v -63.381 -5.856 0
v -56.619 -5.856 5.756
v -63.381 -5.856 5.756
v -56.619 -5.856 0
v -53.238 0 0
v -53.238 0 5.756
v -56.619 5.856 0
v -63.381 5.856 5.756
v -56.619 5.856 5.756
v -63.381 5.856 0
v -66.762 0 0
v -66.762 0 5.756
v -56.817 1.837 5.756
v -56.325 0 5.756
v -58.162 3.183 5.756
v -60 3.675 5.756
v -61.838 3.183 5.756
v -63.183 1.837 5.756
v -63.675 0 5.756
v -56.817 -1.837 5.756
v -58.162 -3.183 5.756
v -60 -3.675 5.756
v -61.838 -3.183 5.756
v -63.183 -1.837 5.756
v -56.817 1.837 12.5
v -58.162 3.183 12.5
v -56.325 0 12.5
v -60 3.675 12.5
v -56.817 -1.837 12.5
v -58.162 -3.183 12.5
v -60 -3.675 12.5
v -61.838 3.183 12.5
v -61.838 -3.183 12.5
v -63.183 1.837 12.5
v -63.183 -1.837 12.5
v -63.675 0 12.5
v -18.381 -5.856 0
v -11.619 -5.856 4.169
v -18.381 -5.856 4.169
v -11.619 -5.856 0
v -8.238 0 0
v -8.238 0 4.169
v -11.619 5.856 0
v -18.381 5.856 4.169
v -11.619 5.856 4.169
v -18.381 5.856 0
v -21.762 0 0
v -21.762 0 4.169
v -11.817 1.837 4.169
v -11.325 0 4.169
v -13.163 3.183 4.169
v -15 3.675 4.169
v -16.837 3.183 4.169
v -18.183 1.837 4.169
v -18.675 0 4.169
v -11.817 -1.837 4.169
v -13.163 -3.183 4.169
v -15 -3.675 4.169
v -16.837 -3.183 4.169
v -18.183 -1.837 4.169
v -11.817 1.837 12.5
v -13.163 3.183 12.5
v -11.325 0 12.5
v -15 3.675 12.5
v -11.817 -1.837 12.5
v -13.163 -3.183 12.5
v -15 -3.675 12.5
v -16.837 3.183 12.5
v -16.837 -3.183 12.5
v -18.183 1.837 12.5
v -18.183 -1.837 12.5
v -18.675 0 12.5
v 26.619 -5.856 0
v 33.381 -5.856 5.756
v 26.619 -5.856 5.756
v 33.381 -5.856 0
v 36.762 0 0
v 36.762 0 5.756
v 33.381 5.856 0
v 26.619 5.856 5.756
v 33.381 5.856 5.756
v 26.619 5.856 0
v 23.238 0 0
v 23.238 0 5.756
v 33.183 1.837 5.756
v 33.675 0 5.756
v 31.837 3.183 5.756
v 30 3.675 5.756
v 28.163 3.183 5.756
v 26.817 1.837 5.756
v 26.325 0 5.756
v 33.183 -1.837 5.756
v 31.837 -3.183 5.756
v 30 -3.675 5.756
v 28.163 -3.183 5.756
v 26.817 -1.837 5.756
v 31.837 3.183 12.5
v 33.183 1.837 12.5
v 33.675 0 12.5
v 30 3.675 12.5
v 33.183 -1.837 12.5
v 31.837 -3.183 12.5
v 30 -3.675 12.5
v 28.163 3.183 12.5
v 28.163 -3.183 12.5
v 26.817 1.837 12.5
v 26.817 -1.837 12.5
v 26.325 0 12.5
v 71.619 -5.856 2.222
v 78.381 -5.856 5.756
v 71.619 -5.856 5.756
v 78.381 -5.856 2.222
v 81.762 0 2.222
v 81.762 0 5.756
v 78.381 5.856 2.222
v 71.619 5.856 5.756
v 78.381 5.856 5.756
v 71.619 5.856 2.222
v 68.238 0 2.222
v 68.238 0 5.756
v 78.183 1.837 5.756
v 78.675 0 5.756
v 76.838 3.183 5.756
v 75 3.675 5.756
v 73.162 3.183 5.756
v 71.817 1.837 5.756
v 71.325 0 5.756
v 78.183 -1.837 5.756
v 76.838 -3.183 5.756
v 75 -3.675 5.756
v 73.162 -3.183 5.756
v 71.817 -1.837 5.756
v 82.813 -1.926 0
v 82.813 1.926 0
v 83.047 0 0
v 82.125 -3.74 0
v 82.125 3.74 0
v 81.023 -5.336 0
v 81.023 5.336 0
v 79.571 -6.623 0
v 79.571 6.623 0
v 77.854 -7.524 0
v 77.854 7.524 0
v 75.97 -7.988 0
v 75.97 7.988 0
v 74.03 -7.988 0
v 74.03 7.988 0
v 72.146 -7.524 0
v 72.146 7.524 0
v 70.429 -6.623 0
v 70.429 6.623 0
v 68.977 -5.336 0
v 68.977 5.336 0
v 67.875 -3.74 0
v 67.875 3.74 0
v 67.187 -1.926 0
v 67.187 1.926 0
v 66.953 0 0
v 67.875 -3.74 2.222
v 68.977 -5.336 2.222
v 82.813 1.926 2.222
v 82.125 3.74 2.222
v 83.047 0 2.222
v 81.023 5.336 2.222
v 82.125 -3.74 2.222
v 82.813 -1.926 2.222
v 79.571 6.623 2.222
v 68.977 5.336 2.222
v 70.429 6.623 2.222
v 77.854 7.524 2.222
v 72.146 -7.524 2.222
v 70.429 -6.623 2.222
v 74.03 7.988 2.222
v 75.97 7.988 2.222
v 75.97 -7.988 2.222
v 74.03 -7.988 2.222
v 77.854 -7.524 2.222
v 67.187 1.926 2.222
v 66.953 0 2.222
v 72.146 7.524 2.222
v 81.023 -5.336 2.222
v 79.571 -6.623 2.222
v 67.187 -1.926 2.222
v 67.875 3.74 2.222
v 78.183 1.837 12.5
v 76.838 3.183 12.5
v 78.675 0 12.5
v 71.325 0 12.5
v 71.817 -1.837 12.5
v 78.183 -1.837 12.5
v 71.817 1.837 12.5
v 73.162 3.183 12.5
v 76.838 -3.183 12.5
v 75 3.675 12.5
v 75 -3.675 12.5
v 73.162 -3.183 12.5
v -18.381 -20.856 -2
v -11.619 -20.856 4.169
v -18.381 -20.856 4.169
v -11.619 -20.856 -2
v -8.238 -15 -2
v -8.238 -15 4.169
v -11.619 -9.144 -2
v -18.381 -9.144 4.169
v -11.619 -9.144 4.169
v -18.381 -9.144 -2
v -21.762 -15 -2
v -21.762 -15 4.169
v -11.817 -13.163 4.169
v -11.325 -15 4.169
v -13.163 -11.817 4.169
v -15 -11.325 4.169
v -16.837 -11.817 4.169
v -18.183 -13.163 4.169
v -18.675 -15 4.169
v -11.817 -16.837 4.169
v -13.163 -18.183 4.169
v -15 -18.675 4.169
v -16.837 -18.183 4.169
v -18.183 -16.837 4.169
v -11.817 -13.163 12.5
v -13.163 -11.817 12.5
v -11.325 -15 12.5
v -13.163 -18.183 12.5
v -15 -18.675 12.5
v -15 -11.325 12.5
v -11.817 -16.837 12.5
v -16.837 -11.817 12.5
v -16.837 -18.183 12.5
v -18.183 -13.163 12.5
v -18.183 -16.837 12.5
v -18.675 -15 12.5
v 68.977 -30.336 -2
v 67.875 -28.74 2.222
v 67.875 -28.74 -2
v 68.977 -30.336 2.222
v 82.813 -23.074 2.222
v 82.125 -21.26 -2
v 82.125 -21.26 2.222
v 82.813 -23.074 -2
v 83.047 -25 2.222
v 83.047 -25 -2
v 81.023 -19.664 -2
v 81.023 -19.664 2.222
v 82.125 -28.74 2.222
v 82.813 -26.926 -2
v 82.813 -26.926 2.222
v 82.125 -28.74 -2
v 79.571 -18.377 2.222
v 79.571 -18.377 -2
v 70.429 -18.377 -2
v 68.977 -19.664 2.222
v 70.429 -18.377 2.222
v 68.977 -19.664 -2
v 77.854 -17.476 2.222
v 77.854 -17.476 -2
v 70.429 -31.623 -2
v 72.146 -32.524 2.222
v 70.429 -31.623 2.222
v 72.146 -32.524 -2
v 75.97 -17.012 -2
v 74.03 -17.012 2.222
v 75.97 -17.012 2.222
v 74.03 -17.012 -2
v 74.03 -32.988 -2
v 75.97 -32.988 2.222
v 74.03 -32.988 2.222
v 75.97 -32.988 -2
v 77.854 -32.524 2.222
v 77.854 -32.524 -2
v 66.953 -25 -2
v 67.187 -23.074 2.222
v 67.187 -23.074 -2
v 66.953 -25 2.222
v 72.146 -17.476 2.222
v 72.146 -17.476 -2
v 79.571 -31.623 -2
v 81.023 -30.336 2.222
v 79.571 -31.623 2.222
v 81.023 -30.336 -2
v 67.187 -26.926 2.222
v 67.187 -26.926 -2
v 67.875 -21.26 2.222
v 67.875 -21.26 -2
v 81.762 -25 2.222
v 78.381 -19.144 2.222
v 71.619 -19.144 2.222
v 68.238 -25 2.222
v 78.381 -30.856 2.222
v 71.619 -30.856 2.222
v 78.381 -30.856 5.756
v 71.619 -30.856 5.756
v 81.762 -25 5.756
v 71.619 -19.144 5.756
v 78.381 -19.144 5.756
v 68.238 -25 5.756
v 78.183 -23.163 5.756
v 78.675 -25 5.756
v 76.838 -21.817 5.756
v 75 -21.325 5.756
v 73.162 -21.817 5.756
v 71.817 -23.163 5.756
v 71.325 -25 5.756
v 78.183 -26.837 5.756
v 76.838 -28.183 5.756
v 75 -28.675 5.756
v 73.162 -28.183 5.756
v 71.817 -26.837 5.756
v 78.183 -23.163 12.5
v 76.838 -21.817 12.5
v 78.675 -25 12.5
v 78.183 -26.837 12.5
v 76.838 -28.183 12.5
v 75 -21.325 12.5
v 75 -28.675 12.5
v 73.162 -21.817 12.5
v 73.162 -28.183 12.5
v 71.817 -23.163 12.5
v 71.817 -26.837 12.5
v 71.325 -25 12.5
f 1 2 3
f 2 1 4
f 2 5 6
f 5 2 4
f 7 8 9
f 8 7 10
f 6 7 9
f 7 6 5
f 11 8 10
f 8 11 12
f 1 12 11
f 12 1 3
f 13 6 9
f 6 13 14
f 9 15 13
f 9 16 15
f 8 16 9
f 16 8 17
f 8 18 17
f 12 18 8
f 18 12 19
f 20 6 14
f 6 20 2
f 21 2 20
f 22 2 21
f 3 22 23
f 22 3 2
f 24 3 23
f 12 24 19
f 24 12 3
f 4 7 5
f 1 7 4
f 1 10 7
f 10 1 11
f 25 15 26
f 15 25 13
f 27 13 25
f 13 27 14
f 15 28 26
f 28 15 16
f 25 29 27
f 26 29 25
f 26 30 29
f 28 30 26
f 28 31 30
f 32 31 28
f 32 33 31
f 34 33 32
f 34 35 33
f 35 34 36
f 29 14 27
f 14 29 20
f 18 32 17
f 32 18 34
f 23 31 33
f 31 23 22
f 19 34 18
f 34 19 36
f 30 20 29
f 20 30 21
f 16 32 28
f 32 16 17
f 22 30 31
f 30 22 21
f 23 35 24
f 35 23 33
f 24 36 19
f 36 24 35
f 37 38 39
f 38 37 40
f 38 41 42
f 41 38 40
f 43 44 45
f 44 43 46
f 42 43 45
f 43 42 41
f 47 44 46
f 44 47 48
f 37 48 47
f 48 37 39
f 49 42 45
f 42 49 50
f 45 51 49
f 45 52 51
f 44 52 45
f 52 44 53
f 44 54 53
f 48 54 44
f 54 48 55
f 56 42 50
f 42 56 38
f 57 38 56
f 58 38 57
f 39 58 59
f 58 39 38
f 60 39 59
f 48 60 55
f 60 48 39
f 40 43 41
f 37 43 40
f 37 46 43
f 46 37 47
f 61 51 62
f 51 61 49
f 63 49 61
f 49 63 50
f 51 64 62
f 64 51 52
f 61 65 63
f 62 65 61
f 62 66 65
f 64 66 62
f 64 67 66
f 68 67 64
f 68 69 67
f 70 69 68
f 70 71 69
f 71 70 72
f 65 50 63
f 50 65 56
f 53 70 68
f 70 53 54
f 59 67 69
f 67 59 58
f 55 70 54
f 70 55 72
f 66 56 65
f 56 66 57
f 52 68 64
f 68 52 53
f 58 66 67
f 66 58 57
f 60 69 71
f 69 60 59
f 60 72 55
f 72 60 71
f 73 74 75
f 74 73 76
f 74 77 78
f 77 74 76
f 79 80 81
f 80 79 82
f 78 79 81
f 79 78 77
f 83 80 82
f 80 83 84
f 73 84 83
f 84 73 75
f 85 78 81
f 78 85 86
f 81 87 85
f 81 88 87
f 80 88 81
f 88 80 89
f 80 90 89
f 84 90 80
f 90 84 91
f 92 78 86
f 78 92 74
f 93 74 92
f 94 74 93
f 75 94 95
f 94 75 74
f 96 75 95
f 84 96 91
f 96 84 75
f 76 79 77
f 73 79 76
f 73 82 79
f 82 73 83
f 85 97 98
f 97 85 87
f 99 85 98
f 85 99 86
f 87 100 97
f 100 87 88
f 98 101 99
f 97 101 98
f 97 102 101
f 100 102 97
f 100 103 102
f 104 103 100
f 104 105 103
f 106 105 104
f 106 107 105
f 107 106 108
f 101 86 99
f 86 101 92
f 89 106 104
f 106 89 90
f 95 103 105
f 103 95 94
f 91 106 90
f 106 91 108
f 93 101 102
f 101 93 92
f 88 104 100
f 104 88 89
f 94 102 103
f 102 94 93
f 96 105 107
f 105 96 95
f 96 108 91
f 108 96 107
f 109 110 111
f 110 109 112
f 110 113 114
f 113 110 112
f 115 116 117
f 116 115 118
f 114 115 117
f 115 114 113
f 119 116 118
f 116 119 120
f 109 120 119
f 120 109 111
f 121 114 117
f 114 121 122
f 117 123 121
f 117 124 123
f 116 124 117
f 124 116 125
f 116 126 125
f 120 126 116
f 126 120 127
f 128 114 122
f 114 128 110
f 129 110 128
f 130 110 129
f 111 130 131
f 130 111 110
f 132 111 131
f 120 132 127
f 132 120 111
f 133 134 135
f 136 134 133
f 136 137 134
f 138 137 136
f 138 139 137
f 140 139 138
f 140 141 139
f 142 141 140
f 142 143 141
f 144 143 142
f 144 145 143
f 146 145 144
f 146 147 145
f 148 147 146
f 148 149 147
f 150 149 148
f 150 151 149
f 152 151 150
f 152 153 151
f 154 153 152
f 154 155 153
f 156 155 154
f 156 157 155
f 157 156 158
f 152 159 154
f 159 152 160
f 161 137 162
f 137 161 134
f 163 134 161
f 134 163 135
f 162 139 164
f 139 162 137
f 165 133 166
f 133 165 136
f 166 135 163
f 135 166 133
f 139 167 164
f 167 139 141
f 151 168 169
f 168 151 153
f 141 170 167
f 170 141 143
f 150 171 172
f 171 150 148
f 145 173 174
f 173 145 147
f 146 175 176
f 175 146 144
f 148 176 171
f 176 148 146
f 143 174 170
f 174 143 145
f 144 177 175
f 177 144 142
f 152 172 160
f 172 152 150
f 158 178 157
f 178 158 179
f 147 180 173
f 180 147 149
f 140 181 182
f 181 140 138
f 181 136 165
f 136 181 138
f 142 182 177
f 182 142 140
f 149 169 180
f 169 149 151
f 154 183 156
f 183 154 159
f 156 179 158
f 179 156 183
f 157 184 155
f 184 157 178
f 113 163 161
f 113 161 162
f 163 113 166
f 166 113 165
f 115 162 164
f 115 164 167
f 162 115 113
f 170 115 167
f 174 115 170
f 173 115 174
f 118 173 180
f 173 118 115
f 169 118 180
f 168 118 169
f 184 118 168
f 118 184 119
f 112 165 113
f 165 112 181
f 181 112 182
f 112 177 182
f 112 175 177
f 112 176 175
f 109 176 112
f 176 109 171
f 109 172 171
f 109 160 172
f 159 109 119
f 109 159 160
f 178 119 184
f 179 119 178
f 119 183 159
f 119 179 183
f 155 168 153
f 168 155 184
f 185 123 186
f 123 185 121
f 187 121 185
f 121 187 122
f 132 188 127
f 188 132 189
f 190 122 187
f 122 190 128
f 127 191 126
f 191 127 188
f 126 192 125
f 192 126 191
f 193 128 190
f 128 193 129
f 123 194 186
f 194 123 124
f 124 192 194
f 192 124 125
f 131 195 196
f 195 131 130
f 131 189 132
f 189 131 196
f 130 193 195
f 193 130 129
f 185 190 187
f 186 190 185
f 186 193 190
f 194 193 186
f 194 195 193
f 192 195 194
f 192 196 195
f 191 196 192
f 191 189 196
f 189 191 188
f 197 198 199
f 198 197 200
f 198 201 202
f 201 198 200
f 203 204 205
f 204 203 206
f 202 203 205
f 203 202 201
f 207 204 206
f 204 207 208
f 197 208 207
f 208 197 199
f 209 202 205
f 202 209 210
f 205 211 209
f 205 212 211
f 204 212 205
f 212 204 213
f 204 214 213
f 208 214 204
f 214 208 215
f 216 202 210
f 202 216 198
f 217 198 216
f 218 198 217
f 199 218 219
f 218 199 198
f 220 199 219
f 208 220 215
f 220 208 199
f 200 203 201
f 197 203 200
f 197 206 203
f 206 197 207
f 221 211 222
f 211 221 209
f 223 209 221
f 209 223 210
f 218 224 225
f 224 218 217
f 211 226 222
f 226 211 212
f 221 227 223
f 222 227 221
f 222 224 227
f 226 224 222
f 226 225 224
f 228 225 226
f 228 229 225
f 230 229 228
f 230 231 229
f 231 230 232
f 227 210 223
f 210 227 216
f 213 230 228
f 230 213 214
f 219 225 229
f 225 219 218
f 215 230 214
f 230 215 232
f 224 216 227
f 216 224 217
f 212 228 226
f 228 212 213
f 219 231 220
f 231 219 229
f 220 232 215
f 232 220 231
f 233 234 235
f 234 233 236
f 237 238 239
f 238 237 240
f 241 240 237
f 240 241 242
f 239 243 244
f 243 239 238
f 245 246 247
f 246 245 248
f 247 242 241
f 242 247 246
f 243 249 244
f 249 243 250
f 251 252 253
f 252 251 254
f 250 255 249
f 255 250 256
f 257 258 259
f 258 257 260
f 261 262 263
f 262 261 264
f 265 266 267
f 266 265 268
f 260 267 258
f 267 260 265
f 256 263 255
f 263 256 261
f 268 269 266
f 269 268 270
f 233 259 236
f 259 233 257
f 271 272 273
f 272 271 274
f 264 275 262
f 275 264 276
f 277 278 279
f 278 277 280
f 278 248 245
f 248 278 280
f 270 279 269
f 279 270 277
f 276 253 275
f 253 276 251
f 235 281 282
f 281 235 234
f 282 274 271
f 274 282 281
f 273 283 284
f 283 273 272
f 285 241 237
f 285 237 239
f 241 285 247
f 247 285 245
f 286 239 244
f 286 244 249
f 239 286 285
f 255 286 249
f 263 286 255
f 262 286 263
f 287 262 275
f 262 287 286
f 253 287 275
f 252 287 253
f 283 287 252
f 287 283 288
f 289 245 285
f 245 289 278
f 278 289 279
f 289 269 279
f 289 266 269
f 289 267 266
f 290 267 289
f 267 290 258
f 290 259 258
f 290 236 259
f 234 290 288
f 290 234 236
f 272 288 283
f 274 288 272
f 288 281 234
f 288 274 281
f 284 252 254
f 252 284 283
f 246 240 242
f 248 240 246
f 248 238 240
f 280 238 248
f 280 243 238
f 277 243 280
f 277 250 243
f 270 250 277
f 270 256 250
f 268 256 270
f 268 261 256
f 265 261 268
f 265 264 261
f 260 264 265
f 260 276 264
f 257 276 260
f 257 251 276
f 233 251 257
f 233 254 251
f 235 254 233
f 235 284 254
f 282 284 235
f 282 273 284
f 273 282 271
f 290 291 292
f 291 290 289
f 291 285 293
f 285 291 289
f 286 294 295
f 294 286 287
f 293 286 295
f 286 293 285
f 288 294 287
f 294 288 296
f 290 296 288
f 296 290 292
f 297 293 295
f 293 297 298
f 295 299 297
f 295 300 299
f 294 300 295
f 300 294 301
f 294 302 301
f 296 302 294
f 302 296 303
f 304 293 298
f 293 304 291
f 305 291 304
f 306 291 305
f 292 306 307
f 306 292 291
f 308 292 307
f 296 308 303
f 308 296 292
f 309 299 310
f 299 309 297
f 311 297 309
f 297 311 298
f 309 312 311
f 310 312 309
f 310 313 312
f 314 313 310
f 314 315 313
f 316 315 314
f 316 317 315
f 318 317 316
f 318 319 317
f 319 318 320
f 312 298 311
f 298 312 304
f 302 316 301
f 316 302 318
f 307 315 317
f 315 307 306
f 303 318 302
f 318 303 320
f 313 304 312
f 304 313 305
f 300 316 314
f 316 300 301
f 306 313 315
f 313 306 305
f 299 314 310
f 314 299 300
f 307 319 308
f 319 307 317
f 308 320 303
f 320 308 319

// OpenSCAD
// =====================================================
// CALCULADORA - TUERCAS UNC/UNF (ANSI/ASME B18.2.2)
// El diámetro nominal se ingresa en PULGADAS (decimal)
// Ej: 1/4" = 0.25 , 3/8" = 0.375 , 1/2" = 0.5
// La serie (UNC/UNF) NO afecta las dimensiones exteriores
// de la tuerca (ancho entre caras / espesor) - solo el paso
// de rosca, por lo que aquí es un dato informativo.
// =====================================================

PULGADA3 = 25.4;
function pulg_a_mm3(p) = p * PULGADA3;

// -----------------------------------------------------
// Tuerca hexagonal NORMAL (ANSI B18.2.2 - Hex Nut)
// [ancho_entre_caras_mm, espesor_mm]
// (valores tomados de tabla ANSI en pulgadas, convertidos a mm)
// -----------------------------------------------------
function tuerca_unc_normal(D_pulg) =
    D_pulg <= 0.164 ? [pulg_a_mm3(5/16),   pulg_a_mm3(7/64)]  : // N°8
    D_pulg <= 0.190 ? [pulg_a_mm3(11/32),  pulg_a_mm3(7/64)]  : // N°10
    D_pulg <= 0.250 ? [pulg_a_mm3(7/16),   pulg_a_mm3(7/32)]  : // 1/4"
    D_pulg <= 0.3125? [pulg_a_mm3(1/2),    pulg_a_mm3(17/64)] : // 5/16"
    D_pulg <= 0.375 ? [pulg_a_mm3(9/16),   pulg_a_mm3(21/64)] : // 3/8"
    D_pulg <= 0.4375? [pulg_a_mm3(11/16),  pulg_a_mm3(3/8)]   : // 7/16"
    D_pulg <= 0.500 ? [pulg_a_mm3(3/4),    pulg_a_mm3(7/16)]  : // 1/2"
    D_pulg <= 0.5625? [pulg_a_mm3(13/16),  pulg_a_mm3(31/64)] : // 9/16"
    D_pulg <= 0.625 ? [pulg_a_mm3(15/16),  pulg_a_mm3(35/64)] : // 5/8"
    D_pulg <= 0.750 ? [pulg_a_mm3(1.125),  pulg_a_mm3(41/64)] : // 3/4"
    D_pulg <= 0.875 ? [pulg_a_mm3(1.3125), pulg_a_mm3(3/4)]   : // 7/8"
    D_pulg <= 1.000 ? [pulg_a_mm3(1.5),    pulg_a_mm3(55/64)] : // 1"
    [pulg_a_mm3(D_pulg) * 1.6, pulg_a_mm3(D_pulg) * 0.9]; // fórmula general

// -----------------------------------------------------
// Tuerca hexagonal JAM/DELGADA (ANSI B18.2.2 - Hex Jam Nut)
// Mismo ancho entre caras, espesor bastante menor
// -----------------------------------------------------
function tuerca_unc_jam(D_pulg) =
    D_pulg <= 0.164 ? [pulg_a_mm3(5/16),  pulg_a_mm3(3/32)]  :
    D_pulg <= 0.190 ? [pulg_a_mm3(11/32), pulg_a_mm3(3/32)]  :
    D_pulg <= 0.250 ? [pulg_a_mm3(7/16),  pulg_a_mm3(5/32)]  :
    D_pulg <= 0.3125? [pulg_a_mm3(1/2),   pulg_a_mm3(3/16)]  :
    D_pulg <= 0.375 ? [pulg_a_mm3(9/16),  pulg_a_mm3(7/32)]  :
    D_pulg <= 0.4375? [pulg_a_mm3(11/16), pulg_a_mm3(1/4)]   :
    D_pulg <= 0.500 ? [pulg_a_mm3(3/4),   pulg_a_mm3(5/16)]  :
    D_pulg <= 0.5625? [pulg_a_mm3(7/8),   pulg_a_mm3(21/64)] :
    D_pulg <= 0.625 ? [pulg_a_mm3(15/16), pulg_a_mm3(3/8)]   :
    D_pulg <= 0.750 ? [pulg_a_mm3(1.125), pulg_a_mm3(27/64)] :
    D_pulg <= 0.875 ? [pulg_a_mm3(1.3125),pulg_a_mm3(31/64)] :
    D_pulg <= 1.000 ? [pulg_a_mm3(1.5),   pulg_a_mm3(35/64)] :
    [pulg_a_mm3(D_pulg) * 1.6, pulg_a_mm3(D_pulg) * 0.5];

// -----------------------------------------------------
// Tuerca AUTOBLOCANTE con inserto de nylon (Nylon Insert
// Lock Nut, ANSI B18.16.6). Valores de REFERENCIA -
// verificar hoja técnica si es crítico.
// -----------------------------------------------------
function tuerca_unc_nylon(D_pulg) =
    D_pulg <= 0.190 ? [pulg_a_mm3(11/32), pulg_a_mm3(5/32)]  :
    D_pulg <= 0.250 ? [pulg_a_mm3(7/16),  pulg_a_mm3(7/32)]  :
    D_pulg <= 0.3125? [pulg_a_mm3(1/2),   pulg_a_mm3(1/4)]   :
    D_pulg <= 0.375 ? [pulg_a_mm3(9/16),  pulg_a_mm3(19/64)] :
    D_pulg <= 0.4375? [pulg_a_mm3(11/16), pulg_a_mm3(3/8)]   :
    D_pulg <= 0.500 ? [pulg_a_mm3(3/4),   pulg_a_mm3(29/64)] :
    D_pulg <= 0.625 ? [pulg_a_mm3(15/16), pulg_a_mm3(35/64)] :
    D_pulg <= 0.750 ? [pulg_a_mm3(1.125), pulg_a_mm3(43/64)] :
    [pulg_a_mm3(D_pulg) * 1.6, pulg_a_mm3(D_pulg) * 1.4];

// -----------------------------------------------------
// Tuerca CON BRIDA (Hex Flange Nut, ANSI/ASME B18.2.2)
// [ancho_entre_caras, espesor, diametro_brida]
// -----------------------------------------------------
function tuerca_unc_brida(D_pulg) =
    D_pulg <= 0.190 ? [pulg_a_mm3(11/32), pulg_a_mm3(5/32), pulg_a_mm3(0.5)]  :
    D_pulg <= 0.250 ? [pulg_a_mm3(7/16),  pulg_a_mm3(7/32), pulg_a_mm3(0.61)] :
    D_pulg <= 0.3125? [pulg_a_mm3(1/2),   pulg_a_mm3(9/32), pulg_a_mm3(0.70)] :
    D_pulg <= 0.375 ? [pulg_a_mm3(9/16),  pulg_a_mm3(5/16), pulg_a_mm3(0.80)] :
    D_pulg <= 0.500 ? [pulg_a_mm3(3/4),   pulg_a_mm3(29/64),pulg_a_mm3(1.00)] :
    [pulg_a_mm3(D_pulg) * 1.6, pulg_a_mm3(D_pulg) * 1.0, pulg_a_mm3(D_pulg) * 2.2];

// -----------------------------------------------------
// FUNCIÓN SELECTORA GENERAL
// tipo: "normal" | "jam" | "nylon" | "brida"
// serie: "UNC" | "UNF" (informativo, no afecta dimensiones)
// -----------------------------------------------------
function tuerca_unc(D_pulg, tipo = "normal", serie = "UNC") =
    tipo == "normal" ? [tuerca_unc_normal(D_pulg)[0], tuerca_unc_normal(D_pulg)[1], 0] :
    tipo == "jam"    ? [tuerca_unc_jam(D_pulg)[0],    tuerca_unc_jam(D_pulg)[1],    0] :
    tipo == "nylon"  ? [tuerca_unc_nylon(D_pulg)[0],  tuerca_unc_nylon(D_pulg)[1],  0] :
    tipo == "brida"  ? tuerca_unc_brida(D_pulg) :
    [tuerca_unc_normal(D_pulg)[0], tuerca_unc_normal(D_pulg)[1], 0];

// =====================================================
// MÓDULO: BOLSILLO HEXAGONAL PARA TUERCA UNC/UNF
// =====================================================
module bolsillo_tuerca_unc(
    diametro_rosca_pulg,
    tipo = "normal",
    profundidad_bolsillo = -1,   // -1 = usar espesor estándar de la norma
    holgura = 0.3,
    holgura_altura = 0.2,
    alivio=0
) {
    datos = tuerca_unc(diametro_rosca_pulg, tipo);
    ancho_caras = datos[0];
    espesor_estandar = datos[1];

    profundidad_real = profundidad_bolsillo < 0 ? espesor_estandar : profundidad_bolsillo;
    radio_hex = (ancho_caras/2 + holgura) / cos(30);

    translate([0, 0, 0])
        cylinder(h = profundidad_real + holgura_altura,
                 r = radio_hex,
                 $fn = 6);

    if (tipo == "brida" && datos[2] > 0) {
        translate([0, 0, 0])
            cylinder(h = profundidad_real * 0.4,
                     r = (datos[2]/2) + holgura);
       if(alivio>0){
        translate([ 0, 0,-alivio])
         color("#AA00AAAA")cylinder(h = alivio,
                     r = (datos[2]/2) + holgura);
         }
     }else if(alivio>0){
     translate([ 0, 0,-alivio])

      color("#AA00AAAA")cylinder(h=alivio,r=radio_hex,$fn = 6);
     }
}

// =====================================================
// MÓDULO: AGUJERO PASANTE PARA EL VÁSTAGO
// =====================================================
module agujero_pasante_tuerca_unc(
    diametro_rosca_pulg,
    profundidad,
    profundidad_bolsillo = 0,
    holgura = 0.5,
    profundidad_abs = true
) {
    diametro_rosca_mm = pulg_a_mm3(diametro_rosca_pulg);

    if (profundidad_abs)
        translate([0, 0, profundidad_bolsillo])
            cylinder(h = profundidad - profundidad_bolsillo,
                     r = (diametro_rosca_mm/2) + holgura);
    else
        translate([0, 0, profundidad_bolsillo])
            cylinder(h = profundidad,
                     r = (diametro_rosca_mm/2) + holgura);
}

// =====================================================
// MÓDULO COMBINADO: TUERCA EMBUTIDA + AGUJERO PASANTE
// profundidad_pieza OBLIGATORIO (para booleanos reales)
// profundidad_bolsillo OPCIONAL (default = norma)
// =====================================================
module agujero_con_tuerca_unc(
    diametro_rosca_pulg,
    profundidad_pieza,             // OBLIGATORIO: espesor real de la pieza
    tipo = "normal",                 // "normal" | "jam" | "nylon" | "brida"
    serie = "UNC",                   // "UNC" | "UNF" (informativo)
    profundidad_bolsillo = -1,       // -1 = usar espesor estándar de la tabla
    holgura_tuerca = 0.3,
    holgura_pasante = 0.5,
    holgura_altura = 0.2,
    margen_corte = 0.5,               // sobresalto para evitar z-fighting
    profundidad_abs = true,
    alivio=0

) {
    datos = tuerca_unc(diametro_rosca_pulg, tipo);
    espesor_estandar = datos[1];

    bolsillo_real = profundidad_bolsillo < 0 ? espesor_estandar : profundidad_bolsillo;

    bolsillo_tuerca_unc(
        diametro_rosca_pulg = diametro_rosca_pulg,
        tipo = tipo,
        profundidad_bolsillo = bolsillo_real,
        holgura = holgura_tuerca,
        holgura_altura = holgura_altura,
        alivio=alivio
    );

    agujero_pasante_tuerca_unc(
        diametro_rosca_pulg = diametro_rosca_pulg,
        profundidad = profundidad_pieza + margen_corte,
        profundidad_bolsillo = bolsillo_real,
        holgura = holgura_pasante,
        profundidad_abs = profundidad_abs
    );
}

// Utilidades
function ancho_caras_tuerca_unc(D_pulg, tipo = "normal") = tuerca_unc(D_pulg, tipo)[0];
function espesor_tuerca_unc(D_pulg, tipo = "normal") = tuerca_unc(D_pulg, tipo)[1];

// =====================================================
// EJEMPLOS CON CASOS CONCRETOS - tuerca_unc(D_pulg, tipo)
// =====================================================
espesor_pieza = 12;
echo("1/4 normal:", tuerca_unc(0.25, "normal"));
translate([-60, 0, 0])
    agujero_con_tuerca_unc(0.25, profundidad_pieza = 12, tipo="normal");

echo("1/4 jam:", tuerca_unc(0.25, "jam"));
translate([-15, 0, 0])
    agujero_con_tuerca_unc(0.25, profundidad_pieza = 12, tipo="jam");

echo("1/4 nylon:", tuerca_unc(0.25, "nylon"));
translate([30, 0, 0])
    agujero_con_tuerca_unc(0.25, profundidad_pieza = 12, tipo="nylon");

echo("1/4 brida:", tuerca_unc(0.25, "brida"));
translate([75, 0, 0])
    agujero_con_tuerca_unc(0.25, profundidad_pieza = 12, tipo="brida");

echo("1/4 jam:", tuerca_unc(0.25, "jam"));
translate([-15, -15, 0])
    agujero_con_tuerca_unc(0.25, profundidad_pieza = 12, tipo="jam", alivio=2);

echo("1/4 brida:", tuerca_unc(0.25, "brida"));
translate([75, -25, 0])
    agujero_con_tuerca_unc(0.25, profundidad_pieza = 12, tipo="brida", alivio=2);
